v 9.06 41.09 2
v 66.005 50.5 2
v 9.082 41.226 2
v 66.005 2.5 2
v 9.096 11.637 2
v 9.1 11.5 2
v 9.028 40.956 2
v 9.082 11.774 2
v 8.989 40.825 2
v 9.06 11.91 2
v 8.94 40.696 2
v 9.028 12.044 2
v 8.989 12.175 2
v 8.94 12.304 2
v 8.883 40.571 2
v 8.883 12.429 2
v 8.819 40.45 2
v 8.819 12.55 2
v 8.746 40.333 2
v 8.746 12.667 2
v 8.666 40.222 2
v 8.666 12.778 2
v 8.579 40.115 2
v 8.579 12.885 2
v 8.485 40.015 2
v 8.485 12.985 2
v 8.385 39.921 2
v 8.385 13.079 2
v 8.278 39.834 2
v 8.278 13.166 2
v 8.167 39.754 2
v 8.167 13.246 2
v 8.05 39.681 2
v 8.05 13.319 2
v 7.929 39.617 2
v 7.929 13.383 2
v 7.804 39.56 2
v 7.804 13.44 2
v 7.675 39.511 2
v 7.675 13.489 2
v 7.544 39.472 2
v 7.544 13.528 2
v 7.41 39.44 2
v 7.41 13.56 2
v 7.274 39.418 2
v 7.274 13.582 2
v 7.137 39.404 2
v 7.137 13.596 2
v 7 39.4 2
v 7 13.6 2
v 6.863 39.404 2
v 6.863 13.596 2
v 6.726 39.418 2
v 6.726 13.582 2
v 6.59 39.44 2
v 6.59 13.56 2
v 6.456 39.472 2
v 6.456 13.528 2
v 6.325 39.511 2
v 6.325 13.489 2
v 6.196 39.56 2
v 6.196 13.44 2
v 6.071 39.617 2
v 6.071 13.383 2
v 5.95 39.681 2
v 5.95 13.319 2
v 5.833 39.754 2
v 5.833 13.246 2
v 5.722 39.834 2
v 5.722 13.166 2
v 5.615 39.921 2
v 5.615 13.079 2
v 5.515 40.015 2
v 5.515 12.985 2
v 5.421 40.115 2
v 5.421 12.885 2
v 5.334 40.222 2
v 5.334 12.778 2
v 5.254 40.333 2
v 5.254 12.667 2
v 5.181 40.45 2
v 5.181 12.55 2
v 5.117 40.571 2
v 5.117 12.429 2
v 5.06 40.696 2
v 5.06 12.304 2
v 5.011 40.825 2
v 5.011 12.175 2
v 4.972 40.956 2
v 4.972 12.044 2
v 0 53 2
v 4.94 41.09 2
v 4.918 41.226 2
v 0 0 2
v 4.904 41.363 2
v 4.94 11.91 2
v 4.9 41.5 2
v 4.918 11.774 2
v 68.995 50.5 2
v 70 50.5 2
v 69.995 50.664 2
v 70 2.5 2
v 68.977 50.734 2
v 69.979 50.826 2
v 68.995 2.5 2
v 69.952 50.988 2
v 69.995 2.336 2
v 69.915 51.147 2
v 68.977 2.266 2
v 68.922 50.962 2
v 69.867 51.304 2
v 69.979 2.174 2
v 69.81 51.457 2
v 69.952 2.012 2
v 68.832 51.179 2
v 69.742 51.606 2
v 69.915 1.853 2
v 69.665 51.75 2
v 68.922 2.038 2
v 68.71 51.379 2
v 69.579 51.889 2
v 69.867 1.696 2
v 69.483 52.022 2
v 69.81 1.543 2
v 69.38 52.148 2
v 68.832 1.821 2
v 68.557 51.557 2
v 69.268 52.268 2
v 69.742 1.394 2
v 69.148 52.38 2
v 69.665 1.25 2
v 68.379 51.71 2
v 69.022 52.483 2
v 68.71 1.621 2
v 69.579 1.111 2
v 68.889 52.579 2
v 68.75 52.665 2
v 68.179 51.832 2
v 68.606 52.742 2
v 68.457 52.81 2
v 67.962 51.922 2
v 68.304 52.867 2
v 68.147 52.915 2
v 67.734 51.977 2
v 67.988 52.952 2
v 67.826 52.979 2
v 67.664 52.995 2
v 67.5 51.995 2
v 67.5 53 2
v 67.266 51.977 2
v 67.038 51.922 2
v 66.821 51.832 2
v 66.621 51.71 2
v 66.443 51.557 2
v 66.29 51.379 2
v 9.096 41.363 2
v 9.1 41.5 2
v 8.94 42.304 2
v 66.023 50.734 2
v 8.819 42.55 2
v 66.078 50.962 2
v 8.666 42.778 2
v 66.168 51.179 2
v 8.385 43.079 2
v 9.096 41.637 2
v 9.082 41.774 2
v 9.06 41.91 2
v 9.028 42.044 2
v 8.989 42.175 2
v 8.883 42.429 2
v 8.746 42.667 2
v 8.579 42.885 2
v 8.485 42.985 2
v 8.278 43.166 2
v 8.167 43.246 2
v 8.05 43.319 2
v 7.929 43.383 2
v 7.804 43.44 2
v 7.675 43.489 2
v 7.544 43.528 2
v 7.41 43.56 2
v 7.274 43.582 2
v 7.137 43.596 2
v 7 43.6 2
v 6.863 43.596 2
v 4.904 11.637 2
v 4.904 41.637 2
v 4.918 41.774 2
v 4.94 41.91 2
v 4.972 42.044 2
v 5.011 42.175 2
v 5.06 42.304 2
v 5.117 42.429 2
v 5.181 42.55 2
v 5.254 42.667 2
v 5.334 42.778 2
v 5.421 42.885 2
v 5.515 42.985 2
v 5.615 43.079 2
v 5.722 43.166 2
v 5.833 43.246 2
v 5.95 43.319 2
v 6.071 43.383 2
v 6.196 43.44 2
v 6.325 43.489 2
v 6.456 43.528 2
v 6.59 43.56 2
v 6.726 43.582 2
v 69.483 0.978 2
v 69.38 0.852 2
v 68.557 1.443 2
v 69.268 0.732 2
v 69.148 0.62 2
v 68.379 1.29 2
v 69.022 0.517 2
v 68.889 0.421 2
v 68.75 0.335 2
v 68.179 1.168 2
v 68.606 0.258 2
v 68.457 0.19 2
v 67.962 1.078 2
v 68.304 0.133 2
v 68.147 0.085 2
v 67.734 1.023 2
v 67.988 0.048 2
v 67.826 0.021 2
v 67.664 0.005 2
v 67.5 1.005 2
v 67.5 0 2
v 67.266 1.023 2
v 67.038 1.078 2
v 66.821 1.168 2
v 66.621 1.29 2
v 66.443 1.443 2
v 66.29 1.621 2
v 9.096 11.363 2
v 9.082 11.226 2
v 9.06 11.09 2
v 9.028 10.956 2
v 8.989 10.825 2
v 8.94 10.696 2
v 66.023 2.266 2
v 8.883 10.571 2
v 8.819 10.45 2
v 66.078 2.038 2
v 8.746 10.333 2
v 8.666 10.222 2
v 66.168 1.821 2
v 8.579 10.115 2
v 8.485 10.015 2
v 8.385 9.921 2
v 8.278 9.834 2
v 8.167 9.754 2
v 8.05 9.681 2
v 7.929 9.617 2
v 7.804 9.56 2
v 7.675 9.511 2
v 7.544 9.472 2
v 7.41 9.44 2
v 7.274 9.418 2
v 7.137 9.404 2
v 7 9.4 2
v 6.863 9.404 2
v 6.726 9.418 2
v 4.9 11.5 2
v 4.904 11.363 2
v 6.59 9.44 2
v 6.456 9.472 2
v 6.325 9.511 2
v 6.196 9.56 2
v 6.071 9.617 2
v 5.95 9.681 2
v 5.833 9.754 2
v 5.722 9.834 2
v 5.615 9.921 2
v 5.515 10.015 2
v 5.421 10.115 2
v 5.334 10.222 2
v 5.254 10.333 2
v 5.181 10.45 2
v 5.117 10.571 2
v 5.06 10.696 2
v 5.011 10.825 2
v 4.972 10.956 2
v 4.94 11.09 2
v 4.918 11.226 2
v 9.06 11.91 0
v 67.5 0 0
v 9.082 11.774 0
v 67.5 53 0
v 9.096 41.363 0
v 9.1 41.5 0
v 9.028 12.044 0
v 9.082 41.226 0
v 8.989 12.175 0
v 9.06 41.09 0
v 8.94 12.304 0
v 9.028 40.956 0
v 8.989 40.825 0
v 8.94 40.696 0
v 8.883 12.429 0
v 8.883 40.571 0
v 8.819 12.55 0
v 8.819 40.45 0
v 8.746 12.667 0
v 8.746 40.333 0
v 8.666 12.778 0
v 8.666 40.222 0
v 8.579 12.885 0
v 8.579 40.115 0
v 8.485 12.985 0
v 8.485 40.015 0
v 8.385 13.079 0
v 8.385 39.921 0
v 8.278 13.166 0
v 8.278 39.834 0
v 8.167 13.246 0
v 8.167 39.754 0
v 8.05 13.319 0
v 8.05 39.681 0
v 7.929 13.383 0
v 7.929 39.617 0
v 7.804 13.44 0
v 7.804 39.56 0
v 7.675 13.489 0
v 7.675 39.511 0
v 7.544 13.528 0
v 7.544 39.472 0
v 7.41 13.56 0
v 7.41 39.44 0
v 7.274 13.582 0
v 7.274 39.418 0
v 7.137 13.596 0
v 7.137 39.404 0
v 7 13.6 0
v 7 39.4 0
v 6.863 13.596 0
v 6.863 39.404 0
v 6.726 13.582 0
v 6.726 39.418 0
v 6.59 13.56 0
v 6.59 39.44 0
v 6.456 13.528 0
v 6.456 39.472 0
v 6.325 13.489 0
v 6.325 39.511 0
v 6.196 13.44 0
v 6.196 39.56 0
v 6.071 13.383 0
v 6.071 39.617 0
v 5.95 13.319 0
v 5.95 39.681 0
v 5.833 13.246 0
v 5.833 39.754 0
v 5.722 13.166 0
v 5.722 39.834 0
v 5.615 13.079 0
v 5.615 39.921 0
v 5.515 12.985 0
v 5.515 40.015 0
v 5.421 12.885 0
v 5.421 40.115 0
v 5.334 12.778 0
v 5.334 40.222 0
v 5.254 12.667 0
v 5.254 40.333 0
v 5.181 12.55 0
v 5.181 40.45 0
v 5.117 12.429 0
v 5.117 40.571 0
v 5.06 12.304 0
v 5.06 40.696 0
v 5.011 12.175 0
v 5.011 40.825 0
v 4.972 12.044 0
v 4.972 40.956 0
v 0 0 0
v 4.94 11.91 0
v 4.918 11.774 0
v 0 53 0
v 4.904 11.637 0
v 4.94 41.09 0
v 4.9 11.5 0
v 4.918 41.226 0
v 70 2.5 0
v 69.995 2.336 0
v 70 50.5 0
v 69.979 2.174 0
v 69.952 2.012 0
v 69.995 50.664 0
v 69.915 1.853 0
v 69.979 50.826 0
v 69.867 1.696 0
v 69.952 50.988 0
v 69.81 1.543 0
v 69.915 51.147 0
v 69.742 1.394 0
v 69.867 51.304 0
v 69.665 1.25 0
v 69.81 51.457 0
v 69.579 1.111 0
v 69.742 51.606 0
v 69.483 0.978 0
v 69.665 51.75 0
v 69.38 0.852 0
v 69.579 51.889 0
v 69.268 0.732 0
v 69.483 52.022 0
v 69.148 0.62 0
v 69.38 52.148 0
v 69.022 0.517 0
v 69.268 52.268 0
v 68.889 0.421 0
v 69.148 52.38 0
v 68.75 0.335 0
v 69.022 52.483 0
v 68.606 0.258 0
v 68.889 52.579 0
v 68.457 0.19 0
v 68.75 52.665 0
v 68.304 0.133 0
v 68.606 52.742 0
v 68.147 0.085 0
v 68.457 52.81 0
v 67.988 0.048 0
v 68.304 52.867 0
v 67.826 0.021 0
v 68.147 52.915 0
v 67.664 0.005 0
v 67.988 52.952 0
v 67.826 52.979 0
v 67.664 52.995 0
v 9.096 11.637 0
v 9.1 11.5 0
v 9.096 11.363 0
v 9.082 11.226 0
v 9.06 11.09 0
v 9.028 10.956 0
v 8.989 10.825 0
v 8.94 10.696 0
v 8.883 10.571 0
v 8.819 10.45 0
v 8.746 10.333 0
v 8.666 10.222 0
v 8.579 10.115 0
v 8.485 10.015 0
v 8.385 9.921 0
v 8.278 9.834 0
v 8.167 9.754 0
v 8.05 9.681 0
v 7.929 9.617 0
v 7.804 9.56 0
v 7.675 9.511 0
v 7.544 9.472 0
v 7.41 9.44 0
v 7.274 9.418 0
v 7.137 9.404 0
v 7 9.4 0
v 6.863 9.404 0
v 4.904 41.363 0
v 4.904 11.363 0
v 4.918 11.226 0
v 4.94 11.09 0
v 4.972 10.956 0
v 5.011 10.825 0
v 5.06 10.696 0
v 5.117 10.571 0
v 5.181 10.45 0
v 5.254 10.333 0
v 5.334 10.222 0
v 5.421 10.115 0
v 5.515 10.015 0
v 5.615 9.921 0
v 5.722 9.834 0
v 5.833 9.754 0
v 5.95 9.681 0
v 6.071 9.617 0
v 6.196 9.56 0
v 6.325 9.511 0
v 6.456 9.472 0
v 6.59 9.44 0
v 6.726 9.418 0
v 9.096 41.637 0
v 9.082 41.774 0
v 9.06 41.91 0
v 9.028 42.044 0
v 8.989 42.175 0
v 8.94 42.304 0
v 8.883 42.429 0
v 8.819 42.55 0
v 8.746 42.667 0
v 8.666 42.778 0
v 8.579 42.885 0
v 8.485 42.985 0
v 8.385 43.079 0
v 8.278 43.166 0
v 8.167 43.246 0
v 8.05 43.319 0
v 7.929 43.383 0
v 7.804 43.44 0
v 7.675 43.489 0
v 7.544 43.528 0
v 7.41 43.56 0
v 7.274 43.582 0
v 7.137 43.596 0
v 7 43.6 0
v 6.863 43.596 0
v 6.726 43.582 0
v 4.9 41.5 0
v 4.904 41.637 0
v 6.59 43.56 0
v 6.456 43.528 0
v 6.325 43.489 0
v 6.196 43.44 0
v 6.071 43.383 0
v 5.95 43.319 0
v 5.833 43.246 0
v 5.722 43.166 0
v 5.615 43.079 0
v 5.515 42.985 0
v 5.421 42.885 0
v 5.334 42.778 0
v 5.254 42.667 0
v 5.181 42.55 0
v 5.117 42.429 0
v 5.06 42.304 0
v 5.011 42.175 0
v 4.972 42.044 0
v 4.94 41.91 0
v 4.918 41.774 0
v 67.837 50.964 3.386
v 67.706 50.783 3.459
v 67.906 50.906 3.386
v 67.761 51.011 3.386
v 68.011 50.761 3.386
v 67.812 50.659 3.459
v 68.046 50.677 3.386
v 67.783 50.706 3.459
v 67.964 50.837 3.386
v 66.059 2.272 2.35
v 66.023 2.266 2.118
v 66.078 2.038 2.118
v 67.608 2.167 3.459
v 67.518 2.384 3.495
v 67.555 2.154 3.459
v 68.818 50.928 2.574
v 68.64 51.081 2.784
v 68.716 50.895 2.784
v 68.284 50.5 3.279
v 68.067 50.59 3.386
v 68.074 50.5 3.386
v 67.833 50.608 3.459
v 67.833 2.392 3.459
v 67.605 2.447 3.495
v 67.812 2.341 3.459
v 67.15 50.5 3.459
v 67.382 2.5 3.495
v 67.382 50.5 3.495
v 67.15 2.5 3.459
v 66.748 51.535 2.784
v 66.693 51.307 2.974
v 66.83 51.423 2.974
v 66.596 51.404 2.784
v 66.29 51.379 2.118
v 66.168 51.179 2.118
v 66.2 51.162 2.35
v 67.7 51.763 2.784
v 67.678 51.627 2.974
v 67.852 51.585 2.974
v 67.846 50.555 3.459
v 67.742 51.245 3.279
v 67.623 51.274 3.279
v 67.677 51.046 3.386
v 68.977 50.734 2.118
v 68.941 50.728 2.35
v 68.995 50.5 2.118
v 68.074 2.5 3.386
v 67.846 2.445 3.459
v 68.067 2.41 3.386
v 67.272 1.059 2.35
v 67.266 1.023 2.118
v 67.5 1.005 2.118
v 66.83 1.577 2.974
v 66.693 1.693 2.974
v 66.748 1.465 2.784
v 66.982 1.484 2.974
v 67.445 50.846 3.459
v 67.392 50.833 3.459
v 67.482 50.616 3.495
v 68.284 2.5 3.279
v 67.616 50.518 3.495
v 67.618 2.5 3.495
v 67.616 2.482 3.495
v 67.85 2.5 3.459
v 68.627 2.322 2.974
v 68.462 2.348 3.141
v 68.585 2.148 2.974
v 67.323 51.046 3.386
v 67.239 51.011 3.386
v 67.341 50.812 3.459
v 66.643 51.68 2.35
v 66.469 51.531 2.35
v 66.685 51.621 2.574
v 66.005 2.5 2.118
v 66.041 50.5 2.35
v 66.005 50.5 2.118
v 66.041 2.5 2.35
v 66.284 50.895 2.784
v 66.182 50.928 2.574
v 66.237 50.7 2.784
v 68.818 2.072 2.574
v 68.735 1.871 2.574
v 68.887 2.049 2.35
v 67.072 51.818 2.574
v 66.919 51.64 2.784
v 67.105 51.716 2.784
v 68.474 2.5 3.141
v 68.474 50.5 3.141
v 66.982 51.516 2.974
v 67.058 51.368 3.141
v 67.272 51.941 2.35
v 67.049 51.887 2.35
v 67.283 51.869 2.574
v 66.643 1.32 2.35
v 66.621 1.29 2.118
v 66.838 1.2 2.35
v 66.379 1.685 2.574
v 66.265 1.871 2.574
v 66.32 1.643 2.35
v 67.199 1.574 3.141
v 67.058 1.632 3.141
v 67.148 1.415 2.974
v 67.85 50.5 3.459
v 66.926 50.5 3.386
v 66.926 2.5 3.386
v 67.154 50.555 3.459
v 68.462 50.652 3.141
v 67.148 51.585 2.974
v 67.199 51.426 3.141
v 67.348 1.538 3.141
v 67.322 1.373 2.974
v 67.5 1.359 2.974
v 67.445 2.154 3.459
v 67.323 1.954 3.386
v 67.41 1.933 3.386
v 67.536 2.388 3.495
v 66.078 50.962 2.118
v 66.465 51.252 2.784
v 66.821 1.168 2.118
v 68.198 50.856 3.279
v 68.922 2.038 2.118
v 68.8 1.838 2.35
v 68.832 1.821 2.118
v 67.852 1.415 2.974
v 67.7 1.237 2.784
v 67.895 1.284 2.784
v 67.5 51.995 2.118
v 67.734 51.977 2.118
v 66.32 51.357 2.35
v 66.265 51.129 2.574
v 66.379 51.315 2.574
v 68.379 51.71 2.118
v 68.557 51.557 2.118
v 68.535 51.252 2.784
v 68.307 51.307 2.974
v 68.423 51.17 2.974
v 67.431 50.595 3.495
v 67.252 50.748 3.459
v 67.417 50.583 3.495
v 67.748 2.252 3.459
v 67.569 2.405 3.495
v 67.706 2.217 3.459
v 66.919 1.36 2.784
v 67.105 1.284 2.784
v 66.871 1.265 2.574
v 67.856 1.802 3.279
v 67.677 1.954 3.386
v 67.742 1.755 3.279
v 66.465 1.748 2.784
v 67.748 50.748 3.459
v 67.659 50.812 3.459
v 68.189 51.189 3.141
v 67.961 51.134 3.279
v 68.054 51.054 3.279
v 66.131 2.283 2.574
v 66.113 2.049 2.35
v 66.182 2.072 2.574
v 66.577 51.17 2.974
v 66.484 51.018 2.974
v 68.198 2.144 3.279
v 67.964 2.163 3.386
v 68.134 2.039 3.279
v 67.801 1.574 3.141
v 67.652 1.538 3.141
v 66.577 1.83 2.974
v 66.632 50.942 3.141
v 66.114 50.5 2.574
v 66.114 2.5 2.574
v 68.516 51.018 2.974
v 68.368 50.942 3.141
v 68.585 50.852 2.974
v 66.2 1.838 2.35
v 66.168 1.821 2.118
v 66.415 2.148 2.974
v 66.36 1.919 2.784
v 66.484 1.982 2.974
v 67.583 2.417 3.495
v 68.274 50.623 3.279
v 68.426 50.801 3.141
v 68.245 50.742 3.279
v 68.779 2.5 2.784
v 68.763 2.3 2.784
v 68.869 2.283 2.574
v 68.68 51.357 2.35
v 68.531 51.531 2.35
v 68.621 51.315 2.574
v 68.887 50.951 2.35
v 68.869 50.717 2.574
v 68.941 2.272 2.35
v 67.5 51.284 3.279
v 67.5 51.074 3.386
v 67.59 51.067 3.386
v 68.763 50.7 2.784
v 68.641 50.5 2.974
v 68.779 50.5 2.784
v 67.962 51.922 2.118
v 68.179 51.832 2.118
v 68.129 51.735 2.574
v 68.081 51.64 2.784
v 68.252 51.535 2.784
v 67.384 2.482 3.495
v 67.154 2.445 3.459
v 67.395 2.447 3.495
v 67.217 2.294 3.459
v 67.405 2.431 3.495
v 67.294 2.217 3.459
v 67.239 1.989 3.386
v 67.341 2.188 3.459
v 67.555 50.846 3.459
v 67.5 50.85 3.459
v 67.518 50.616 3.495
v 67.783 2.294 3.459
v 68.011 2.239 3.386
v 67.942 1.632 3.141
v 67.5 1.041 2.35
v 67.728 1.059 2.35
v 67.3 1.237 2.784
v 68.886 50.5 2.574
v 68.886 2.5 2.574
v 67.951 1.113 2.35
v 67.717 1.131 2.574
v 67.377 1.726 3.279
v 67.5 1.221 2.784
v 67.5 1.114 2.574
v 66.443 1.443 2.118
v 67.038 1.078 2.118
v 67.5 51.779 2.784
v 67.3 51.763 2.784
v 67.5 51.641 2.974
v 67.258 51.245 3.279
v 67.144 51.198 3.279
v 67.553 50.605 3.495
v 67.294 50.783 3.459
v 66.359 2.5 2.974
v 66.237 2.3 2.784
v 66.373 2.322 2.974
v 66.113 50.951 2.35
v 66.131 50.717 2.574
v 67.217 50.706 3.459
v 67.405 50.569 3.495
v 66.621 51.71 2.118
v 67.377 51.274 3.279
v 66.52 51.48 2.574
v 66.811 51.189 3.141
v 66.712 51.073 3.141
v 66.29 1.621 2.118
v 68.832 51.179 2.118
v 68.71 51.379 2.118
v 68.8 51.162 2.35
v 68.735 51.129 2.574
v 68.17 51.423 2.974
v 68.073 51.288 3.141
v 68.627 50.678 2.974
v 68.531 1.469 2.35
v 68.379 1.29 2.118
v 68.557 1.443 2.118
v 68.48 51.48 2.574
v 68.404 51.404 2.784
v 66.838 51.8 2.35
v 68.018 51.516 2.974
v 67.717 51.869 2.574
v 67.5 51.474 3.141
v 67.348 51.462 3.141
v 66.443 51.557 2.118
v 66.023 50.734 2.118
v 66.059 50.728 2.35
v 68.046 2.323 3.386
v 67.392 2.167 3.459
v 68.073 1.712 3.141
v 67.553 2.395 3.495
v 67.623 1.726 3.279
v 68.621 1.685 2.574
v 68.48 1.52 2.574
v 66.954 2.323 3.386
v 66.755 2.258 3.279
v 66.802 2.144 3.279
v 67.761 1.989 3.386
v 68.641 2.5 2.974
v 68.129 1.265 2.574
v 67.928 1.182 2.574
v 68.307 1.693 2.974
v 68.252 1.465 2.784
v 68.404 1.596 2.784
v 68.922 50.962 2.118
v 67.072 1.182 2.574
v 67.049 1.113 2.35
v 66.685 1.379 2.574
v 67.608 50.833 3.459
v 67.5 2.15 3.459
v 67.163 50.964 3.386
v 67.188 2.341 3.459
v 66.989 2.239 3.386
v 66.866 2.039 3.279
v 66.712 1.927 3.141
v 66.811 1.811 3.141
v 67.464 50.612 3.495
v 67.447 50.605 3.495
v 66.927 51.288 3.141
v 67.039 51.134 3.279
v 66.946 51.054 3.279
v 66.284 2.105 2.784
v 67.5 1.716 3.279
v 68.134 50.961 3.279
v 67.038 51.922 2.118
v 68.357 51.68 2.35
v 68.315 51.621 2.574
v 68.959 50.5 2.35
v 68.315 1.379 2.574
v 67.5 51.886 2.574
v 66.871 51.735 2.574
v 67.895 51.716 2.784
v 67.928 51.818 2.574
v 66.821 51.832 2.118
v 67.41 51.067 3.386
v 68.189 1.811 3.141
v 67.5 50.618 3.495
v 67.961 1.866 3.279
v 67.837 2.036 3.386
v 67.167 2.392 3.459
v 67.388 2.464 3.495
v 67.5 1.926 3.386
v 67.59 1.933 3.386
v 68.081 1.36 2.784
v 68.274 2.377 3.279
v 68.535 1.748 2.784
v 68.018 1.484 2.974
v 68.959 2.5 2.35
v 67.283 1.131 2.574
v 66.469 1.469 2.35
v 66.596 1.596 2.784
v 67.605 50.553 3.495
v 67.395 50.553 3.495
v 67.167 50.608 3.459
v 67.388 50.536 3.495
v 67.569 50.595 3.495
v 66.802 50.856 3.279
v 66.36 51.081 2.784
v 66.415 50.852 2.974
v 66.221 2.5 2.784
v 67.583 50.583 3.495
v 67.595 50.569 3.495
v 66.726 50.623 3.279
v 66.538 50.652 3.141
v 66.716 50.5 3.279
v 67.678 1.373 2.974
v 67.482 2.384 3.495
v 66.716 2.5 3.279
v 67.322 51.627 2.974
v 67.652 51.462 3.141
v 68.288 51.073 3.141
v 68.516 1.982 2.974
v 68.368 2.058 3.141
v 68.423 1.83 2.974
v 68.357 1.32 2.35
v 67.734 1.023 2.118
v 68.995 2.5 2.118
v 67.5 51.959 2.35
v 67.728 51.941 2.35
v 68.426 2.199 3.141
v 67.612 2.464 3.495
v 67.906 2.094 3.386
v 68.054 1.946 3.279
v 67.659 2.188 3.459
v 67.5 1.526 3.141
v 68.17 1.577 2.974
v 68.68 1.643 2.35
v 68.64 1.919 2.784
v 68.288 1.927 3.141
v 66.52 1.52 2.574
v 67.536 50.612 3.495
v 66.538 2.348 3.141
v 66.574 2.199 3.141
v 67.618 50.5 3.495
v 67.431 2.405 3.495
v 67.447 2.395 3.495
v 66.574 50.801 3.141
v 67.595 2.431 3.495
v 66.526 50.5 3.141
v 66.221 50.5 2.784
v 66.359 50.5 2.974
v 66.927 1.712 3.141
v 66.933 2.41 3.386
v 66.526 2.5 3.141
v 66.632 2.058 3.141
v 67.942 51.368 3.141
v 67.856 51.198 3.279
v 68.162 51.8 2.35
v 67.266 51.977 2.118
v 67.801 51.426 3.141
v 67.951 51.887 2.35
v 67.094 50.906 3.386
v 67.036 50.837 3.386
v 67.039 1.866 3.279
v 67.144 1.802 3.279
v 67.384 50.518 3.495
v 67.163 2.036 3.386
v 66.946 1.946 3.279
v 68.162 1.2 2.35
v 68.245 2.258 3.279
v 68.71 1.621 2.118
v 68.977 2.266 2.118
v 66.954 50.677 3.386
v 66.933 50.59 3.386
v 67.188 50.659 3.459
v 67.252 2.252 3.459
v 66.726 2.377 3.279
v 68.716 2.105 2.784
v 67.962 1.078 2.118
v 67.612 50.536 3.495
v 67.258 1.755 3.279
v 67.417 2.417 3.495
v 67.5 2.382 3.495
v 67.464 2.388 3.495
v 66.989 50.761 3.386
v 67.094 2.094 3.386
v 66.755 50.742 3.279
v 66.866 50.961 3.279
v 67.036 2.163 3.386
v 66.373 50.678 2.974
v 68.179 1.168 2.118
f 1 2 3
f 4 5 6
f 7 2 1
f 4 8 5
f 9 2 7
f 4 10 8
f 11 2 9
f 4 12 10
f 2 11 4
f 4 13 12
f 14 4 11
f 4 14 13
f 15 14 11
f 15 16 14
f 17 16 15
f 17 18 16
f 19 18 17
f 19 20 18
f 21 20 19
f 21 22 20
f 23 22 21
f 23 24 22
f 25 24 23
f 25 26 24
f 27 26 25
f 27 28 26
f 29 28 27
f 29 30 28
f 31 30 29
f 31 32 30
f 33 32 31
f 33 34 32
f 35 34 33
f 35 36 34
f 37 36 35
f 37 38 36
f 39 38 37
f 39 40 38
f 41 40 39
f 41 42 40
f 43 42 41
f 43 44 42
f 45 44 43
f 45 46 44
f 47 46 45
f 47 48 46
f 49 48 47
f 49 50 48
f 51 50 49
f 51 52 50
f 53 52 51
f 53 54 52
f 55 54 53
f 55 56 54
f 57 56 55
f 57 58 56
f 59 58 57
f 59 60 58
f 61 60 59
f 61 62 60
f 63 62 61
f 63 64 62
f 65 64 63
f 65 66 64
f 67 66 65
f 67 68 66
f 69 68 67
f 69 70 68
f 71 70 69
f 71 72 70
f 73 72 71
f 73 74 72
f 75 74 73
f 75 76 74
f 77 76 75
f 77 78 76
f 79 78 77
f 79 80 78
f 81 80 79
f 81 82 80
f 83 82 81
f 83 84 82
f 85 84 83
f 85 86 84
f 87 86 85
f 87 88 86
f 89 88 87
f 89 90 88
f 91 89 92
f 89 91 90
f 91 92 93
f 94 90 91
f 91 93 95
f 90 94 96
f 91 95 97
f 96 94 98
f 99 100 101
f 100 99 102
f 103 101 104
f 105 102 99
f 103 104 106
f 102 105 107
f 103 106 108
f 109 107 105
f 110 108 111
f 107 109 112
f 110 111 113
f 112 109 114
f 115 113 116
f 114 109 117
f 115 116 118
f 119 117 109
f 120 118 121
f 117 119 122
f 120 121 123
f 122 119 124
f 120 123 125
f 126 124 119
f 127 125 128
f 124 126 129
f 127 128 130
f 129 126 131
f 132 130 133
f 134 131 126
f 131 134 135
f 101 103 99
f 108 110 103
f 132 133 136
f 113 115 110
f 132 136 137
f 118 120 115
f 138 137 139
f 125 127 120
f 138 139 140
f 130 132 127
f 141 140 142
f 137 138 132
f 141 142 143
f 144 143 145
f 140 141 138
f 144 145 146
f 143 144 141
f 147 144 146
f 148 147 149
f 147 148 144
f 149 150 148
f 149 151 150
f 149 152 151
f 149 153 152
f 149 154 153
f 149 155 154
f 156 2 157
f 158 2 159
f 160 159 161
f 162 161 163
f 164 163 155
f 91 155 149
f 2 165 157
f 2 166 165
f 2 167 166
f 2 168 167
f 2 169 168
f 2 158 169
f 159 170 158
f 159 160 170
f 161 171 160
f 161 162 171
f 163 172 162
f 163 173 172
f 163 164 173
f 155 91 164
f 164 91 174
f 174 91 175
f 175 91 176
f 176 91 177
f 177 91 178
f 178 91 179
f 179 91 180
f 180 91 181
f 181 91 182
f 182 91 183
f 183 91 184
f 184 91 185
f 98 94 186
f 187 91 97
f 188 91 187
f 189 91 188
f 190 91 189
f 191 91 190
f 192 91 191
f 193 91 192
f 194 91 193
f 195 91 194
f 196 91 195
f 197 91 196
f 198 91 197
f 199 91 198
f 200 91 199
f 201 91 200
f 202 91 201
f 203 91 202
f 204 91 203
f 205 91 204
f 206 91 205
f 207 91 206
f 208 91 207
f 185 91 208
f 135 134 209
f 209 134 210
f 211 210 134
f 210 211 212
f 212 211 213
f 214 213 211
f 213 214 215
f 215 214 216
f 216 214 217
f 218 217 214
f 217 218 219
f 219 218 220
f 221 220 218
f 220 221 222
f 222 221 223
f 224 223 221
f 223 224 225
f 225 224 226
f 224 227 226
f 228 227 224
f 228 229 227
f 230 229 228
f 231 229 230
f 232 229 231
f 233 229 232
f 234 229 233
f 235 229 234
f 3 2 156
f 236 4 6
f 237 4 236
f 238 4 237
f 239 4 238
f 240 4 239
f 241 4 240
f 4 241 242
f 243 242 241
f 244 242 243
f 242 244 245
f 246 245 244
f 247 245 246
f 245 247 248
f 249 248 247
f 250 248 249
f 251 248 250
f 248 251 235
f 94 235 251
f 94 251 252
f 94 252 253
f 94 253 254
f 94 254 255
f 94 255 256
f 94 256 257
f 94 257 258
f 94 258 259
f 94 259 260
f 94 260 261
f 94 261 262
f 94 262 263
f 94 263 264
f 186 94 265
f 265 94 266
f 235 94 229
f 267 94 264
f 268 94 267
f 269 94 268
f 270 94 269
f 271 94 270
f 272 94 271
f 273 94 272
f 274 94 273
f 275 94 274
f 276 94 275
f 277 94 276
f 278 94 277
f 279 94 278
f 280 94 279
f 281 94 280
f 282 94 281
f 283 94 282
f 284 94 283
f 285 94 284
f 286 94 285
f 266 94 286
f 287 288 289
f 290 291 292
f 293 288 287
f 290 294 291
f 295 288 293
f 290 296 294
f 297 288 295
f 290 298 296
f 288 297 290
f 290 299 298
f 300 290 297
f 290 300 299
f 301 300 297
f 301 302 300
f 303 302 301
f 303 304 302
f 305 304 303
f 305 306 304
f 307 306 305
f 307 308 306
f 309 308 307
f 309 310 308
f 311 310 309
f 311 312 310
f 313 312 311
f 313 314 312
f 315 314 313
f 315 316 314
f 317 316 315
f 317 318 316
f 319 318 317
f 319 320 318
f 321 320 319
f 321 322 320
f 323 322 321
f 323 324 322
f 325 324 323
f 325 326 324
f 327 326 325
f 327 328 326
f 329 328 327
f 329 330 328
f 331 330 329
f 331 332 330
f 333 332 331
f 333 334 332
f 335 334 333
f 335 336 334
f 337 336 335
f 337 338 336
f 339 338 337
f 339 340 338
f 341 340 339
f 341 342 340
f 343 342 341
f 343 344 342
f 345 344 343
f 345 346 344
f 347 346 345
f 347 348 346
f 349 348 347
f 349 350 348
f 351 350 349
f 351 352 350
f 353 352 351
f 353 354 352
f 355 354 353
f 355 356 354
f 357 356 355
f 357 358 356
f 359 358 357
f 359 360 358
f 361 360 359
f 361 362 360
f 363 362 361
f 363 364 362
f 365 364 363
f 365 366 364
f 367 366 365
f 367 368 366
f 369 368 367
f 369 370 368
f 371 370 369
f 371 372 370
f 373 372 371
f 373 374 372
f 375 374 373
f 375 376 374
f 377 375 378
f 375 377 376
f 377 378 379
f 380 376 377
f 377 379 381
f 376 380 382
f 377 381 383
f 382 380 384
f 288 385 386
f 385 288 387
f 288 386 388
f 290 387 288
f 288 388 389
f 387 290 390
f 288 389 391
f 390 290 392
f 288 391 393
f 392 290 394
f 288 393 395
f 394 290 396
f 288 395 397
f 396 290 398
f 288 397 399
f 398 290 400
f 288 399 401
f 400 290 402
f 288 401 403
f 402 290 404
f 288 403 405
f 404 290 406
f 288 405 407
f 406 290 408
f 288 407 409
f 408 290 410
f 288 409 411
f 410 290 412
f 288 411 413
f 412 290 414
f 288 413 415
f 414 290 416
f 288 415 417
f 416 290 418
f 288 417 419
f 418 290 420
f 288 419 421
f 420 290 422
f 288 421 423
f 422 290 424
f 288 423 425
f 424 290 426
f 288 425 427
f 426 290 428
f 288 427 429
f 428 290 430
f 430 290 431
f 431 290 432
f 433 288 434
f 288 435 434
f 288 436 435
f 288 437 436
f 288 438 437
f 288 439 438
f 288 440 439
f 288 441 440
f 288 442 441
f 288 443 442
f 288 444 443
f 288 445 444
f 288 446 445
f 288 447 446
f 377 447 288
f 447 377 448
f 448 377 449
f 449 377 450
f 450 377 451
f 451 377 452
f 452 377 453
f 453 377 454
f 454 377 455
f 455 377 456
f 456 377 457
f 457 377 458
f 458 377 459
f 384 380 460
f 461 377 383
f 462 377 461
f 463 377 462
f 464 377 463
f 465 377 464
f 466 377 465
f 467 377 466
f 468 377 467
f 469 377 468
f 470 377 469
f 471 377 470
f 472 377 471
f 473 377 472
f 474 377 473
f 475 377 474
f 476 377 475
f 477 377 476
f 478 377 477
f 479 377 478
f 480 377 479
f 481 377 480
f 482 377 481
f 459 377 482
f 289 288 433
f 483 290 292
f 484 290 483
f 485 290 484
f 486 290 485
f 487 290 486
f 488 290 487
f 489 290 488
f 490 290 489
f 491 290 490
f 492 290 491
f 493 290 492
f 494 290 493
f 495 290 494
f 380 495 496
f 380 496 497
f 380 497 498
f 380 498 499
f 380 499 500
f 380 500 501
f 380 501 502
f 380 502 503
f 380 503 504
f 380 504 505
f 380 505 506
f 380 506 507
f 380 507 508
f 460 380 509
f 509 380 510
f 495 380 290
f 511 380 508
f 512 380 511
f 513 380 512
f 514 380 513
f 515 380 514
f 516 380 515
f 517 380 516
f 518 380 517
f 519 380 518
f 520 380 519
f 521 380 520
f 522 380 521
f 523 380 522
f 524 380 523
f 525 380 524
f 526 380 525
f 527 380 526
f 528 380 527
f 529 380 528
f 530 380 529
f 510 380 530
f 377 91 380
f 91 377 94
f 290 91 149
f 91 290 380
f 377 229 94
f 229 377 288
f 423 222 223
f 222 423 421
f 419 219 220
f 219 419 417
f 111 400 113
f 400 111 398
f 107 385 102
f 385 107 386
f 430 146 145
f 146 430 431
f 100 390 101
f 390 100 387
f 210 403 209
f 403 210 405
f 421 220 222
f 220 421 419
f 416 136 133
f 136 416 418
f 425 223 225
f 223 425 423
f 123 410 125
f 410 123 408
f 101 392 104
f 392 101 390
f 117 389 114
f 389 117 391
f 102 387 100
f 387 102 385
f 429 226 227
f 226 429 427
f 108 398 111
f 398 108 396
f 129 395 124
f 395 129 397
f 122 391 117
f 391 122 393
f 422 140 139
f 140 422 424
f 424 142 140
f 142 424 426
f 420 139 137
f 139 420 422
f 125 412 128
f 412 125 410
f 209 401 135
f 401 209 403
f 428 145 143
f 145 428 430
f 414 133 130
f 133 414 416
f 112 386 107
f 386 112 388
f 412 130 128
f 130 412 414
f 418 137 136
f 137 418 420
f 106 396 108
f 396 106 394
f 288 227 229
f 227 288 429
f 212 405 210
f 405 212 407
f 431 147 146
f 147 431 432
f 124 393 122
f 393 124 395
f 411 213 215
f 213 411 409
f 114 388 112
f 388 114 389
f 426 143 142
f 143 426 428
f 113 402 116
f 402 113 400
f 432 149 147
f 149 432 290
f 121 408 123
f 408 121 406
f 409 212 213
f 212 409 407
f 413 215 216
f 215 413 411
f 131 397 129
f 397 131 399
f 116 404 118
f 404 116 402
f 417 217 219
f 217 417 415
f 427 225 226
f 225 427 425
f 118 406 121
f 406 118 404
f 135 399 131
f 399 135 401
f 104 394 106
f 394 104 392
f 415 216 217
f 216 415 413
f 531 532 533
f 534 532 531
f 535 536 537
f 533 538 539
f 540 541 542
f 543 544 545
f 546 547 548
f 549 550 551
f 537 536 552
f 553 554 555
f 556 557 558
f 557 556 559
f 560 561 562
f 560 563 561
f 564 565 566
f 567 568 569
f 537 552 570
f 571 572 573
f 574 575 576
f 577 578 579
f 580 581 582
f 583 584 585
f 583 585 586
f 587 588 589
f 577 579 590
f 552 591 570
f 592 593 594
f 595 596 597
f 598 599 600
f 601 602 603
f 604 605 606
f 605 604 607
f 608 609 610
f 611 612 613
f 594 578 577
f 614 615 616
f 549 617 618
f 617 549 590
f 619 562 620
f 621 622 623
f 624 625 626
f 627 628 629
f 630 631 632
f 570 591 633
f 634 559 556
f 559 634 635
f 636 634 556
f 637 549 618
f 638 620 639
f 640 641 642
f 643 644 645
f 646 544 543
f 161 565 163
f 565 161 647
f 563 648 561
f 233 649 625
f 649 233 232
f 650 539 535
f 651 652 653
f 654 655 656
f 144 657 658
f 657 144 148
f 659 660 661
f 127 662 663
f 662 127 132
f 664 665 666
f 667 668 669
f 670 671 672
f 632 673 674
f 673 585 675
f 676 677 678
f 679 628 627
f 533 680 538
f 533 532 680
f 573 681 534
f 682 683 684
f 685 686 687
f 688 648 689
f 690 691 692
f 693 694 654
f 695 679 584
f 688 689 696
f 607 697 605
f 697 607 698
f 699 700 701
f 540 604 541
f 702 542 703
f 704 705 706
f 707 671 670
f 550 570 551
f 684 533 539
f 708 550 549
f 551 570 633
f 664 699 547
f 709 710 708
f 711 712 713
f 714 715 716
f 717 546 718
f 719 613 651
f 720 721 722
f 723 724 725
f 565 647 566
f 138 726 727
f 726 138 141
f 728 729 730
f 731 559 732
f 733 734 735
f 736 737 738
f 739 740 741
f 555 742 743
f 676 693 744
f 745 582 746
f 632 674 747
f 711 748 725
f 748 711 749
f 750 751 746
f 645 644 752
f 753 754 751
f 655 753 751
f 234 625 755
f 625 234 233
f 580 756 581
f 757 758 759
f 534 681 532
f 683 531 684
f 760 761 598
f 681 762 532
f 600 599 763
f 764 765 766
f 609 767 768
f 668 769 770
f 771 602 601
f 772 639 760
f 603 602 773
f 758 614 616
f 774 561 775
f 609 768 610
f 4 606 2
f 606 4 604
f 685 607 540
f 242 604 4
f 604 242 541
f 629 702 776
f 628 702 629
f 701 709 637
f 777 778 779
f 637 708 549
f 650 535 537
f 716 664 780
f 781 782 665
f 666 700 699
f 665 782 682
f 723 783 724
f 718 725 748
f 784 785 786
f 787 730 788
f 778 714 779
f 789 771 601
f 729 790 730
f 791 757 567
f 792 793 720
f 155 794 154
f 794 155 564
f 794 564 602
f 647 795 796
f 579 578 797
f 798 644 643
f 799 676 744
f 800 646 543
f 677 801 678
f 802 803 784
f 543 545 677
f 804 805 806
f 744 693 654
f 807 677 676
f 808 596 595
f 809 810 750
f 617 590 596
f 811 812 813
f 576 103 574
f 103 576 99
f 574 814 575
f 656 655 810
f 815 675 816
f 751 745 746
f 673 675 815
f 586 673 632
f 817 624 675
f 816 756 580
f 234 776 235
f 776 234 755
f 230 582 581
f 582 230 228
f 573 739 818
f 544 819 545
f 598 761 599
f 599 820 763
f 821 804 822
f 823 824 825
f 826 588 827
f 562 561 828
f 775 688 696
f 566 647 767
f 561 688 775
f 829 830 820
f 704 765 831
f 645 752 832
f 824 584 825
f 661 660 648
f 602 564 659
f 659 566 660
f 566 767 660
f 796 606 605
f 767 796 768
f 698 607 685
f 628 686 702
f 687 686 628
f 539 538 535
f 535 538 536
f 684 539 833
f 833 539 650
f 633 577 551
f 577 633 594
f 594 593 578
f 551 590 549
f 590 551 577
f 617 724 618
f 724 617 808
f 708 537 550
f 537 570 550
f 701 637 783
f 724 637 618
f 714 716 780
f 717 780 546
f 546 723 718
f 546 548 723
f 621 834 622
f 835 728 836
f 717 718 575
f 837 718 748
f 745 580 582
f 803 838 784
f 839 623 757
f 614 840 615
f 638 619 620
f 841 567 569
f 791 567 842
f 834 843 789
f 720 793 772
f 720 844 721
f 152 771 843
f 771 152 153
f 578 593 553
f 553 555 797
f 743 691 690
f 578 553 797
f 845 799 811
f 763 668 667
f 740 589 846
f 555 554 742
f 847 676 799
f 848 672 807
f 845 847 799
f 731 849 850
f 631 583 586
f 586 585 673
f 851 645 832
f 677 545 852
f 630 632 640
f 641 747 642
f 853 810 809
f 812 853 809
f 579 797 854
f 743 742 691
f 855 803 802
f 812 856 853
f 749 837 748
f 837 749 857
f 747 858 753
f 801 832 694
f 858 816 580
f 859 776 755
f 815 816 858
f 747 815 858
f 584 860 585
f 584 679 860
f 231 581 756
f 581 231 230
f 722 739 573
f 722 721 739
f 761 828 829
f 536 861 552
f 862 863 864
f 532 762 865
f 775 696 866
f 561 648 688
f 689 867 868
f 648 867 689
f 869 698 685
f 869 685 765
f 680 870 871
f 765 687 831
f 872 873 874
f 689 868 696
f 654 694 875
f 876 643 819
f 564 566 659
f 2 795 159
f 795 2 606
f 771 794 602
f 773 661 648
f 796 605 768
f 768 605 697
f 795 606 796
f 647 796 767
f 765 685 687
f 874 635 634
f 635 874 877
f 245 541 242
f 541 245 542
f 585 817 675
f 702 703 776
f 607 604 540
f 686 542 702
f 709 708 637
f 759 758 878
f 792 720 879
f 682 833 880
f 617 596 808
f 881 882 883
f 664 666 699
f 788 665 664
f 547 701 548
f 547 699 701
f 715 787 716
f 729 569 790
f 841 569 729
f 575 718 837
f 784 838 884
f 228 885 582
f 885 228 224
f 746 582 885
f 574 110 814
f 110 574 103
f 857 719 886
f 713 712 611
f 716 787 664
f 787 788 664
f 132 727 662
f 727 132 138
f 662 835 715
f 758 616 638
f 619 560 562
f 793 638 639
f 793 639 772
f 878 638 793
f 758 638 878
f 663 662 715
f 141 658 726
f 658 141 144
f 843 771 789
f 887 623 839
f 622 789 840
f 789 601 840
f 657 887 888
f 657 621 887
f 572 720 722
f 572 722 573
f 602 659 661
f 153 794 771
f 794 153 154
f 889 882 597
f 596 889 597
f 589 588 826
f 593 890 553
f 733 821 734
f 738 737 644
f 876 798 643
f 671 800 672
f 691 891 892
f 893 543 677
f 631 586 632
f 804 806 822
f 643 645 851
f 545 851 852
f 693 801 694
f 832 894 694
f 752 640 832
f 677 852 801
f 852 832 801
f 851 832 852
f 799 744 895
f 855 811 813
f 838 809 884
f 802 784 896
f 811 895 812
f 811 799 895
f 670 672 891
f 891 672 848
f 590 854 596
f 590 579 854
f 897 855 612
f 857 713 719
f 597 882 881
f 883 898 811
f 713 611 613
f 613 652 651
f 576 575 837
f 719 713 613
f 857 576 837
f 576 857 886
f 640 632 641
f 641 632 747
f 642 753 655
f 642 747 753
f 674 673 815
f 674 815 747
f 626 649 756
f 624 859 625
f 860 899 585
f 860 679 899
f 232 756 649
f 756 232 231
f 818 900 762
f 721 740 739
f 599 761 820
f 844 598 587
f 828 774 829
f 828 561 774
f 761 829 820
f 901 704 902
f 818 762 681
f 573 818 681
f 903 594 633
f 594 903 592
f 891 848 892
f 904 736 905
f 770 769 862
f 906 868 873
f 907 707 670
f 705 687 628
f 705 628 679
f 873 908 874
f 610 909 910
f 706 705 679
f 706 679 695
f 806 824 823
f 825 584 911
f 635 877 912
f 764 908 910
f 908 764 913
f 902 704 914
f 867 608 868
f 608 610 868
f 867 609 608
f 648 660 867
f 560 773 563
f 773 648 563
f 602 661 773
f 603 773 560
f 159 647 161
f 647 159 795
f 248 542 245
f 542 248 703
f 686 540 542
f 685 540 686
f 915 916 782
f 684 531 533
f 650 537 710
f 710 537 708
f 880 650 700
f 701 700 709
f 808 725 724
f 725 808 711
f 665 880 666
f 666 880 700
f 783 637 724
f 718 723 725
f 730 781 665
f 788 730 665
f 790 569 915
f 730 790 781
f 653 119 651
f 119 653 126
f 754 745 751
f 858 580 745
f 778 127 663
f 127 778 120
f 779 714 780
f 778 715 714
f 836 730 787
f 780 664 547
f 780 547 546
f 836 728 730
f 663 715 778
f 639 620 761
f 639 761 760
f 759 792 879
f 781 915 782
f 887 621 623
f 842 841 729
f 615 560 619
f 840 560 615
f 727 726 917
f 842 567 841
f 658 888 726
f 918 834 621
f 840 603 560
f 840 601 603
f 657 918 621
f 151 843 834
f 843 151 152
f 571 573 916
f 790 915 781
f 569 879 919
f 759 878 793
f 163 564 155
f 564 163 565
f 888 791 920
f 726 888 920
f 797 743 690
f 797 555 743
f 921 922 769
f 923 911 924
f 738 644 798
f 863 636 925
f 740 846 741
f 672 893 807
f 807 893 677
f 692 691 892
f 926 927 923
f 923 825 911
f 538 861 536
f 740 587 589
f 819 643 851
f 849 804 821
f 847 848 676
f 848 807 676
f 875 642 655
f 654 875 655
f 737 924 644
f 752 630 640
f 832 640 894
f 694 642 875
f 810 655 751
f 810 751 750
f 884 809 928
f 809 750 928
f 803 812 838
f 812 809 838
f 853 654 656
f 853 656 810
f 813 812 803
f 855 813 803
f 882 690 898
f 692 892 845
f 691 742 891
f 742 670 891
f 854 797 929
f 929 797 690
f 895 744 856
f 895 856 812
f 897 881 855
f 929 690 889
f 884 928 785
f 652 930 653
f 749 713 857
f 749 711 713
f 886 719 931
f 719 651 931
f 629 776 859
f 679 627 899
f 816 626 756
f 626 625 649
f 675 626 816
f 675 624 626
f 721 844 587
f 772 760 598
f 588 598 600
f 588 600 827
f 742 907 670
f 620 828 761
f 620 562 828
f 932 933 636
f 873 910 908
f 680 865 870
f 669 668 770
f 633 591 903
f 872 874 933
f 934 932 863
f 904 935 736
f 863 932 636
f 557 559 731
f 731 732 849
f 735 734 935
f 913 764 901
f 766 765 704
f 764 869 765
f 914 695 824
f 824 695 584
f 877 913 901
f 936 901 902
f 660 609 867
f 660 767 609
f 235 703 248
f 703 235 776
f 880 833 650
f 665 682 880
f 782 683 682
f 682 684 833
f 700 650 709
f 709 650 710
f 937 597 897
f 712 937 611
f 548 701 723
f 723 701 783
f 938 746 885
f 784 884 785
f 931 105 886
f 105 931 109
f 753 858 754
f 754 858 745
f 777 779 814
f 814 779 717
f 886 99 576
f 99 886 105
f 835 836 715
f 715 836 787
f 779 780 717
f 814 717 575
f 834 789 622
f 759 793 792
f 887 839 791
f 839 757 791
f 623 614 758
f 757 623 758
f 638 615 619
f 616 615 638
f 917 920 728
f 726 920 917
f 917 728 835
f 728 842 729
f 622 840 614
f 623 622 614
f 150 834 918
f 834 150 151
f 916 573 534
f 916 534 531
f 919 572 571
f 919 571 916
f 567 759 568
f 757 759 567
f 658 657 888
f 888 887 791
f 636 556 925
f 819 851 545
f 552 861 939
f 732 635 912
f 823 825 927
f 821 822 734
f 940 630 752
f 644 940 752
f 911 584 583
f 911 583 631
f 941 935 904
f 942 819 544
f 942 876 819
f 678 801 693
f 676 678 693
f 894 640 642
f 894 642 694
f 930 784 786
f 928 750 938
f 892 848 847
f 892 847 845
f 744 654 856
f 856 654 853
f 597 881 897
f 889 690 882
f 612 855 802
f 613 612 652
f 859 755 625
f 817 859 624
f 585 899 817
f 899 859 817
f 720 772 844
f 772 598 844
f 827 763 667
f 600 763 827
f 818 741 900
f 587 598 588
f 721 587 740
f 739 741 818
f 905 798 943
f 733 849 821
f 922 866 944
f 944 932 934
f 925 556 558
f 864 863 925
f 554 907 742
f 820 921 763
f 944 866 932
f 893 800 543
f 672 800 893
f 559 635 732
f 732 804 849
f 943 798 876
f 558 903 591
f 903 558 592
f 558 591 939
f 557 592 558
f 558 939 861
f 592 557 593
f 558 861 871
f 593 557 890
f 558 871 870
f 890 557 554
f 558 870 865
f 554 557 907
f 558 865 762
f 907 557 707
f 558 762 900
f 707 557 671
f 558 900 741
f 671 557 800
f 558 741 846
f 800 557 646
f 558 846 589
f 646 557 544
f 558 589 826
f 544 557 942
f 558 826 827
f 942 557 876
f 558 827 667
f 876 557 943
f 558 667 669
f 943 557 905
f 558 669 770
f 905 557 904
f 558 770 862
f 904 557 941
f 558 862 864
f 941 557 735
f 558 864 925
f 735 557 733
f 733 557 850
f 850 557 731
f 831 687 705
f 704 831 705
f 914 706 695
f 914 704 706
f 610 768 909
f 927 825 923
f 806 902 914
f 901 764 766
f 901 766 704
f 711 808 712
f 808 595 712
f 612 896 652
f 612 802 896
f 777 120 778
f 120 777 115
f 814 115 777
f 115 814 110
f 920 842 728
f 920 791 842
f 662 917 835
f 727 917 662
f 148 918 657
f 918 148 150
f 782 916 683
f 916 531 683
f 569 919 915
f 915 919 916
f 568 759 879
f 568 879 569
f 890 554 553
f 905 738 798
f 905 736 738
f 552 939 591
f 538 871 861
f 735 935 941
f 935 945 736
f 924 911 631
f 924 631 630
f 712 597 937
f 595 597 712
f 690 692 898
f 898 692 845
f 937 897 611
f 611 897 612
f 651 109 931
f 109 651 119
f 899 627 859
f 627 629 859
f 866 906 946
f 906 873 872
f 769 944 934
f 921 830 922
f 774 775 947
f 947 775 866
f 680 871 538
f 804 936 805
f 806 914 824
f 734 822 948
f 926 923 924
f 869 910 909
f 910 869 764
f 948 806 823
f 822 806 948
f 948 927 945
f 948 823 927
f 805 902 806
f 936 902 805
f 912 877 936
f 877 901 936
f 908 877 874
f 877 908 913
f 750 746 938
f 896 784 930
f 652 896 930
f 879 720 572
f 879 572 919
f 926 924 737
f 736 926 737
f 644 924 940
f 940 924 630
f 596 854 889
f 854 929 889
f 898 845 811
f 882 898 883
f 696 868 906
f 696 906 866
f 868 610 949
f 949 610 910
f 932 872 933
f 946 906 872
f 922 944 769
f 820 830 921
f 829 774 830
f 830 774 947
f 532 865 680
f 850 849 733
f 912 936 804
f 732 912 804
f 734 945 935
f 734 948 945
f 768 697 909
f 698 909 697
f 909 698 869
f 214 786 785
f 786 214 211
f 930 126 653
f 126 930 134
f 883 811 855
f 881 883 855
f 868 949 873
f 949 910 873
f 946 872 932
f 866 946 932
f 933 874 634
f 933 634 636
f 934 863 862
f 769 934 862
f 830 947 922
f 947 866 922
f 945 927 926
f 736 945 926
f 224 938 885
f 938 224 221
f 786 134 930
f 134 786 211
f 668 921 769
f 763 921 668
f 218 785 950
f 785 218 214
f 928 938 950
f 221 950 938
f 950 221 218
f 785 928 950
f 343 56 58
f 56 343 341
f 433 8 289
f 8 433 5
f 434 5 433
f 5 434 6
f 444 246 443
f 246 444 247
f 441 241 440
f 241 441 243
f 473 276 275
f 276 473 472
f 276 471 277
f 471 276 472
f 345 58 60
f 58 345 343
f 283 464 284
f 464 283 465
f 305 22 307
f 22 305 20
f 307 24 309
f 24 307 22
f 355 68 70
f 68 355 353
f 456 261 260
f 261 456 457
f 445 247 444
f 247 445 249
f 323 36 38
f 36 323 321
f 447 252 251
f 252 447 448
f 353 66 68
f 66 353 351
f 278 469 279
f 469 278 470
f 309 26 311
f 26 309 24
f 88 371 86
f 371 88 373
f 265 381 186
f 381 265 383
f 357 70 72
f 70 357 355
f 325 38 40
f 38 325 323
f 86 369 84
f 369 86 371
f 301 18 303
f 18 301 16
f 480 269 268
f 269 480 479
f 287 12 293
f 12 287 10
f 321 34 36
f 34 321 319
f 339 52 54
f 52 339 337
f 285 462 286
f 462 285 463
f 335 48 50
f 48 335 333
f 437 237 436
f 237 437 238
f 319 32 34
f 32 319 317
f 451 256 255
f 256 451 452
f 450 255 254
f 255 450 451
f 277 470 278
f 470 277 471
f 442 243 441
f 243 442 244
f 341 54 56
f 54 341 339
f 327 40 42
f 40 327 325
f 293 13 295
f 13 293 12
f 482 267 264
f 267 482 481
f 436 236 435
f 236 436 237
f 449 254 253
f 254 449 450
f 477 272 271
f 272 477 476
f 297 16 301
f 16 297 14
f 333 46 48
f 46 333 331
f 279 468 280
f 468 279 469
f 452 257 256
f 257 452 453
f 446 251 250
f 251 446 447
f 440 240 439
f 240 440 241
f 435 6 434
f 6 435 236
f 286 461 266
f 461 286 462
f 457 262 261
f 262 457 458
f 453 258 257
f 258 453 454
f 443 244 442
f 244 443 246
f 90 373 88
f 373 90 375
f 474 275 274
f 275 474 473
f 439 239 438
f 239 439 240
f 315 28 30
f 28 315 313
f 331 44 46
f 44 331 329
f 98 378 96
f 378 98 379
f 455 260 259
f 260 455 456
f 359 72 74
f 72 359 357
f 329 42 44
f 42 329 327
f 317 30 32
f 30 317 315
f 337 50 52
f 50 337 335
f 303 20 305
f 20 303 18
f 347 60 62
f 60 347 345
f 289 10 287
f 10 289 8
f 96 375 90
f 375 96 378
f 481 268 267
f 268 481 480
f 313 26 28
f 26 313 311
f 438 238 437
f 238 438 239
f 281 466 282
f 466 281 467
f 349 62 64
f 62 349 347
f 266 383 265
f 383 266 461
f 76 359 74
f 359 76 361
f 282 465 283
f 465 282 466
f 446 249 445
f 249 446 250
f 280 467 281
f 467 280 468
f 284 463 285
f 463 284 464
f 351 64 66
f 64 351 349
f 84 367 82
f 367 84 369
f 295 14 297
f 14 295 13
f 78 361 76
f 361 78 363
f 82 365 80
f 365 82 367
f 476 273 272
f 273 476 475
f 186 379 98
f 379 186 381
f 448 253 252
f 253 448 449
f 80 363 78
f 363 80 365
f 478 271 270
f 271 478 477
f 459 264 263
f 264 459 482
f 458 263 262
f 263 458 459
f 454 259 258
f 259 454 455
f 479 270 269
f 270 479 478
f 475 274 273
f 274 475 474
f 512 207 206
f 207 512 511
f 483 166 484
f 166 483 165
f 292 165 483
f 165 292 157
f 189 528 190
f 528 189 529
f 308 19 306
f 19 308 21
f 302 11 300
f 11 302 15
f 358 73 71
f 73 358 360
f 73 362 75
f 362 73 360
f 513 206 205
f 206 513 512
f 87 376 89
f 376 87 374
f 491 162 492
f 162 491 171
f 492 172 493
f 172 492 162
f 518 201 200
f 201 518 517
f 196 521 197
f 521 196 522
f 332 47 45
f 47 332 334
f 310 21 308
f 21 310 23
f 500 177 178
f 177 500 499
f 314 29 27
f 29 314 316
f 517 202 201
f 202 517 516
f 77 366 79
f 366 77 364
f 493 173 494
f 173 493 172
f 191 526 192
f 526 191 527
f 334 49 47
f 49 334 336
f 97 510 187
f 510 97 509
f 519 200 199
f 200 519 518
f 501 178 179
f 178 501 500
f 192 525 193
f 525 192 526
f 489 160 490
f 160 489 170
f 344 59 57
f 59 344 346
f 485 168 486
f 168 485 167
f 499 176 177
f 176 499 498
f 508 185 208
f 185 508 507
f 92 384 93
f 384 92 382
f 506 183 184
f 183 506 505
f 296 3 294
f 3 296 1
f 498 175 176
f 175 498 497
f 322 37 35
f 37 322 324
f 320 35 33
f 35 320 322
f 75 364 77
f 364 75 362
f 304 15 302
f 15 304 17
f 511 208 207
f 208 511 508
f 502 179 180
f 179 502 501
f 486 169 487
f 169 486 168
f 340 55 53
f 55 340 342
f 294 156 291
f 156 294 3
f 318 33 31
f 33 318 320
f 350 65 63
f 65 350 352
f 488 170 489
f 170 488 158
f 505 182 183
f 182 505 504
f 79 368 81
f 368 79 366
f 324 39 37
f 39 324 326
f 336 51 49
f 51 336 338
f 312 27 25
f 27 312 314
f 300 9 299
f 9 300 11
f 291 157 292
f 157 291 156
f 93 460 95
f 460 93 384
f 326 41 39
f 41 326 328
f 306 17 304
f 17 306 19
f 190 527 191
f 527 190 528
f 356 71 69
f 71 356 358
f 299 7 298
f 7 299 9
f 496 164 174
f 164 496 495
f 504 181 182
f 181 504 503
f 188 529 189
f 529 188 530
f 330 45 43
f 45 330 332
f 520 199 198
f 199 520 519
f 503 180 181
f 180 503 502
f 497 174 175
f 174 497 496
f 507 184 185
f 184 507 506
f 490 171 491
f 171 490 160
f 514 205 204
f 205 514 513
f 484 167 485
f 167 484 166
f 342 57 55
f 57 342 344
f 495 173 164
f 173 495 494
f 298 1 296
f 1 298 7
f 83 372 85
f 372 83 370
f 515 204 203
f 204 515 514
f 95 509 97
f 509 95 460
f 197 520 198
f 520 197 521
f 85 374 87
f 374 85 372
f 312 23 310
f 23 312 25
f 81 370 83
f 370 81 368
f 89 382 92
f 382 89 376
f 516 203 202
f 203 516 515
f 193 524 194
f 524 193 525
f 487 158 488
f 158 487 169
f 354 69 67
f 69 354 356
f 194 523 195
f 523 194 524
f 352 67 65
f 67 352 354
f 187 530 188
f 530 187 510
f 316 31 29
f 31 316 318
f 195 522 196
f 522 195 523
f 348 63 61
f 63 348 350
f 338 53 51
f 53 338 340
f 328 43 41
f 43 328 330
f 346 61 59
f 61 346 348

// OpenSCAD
// width
width = 70;

// length
length = 53;

// thickness
height = 2;

// rounded corners radius
corner_radius = 5;

// screw holes x offset
offset_x = 7;

// distance between holes
offset_y = 11.5;

// screw hole diameter
hole_diameter = 4.2;

// radius for beading
radius = 1.5;

/* [hidden] */
clearance = 0.01;


difference() {

    // plate
    union() {
        cube([width-corner_radius/2, length, height]);

        hull() {
            translate ([width-corner_radius/2, corner_radius/2, 0]) {
                cylinder(d=corner_radius, h=height, $fn=96);
            }
            translate ([width-corner_radius/2, length-corner_radius/2, 0]) {
                cylinder(d=corner_radius, h=height, $fn=96);
            }
        }

        hull () {
            translate ([width-corner_radius/2, corner_radius/2, height]) {
                sphere(radius, $fn = 40);
            }
            translate ([width-corner_radius/2, length-corner_radius/2, height]) {
                sphere(radius, $fn = 40);
            }
        }
    }

    // hole front
    translate ([offset_x, offset_y, -clearance]) {
        cylinder(d=hole_diameter, h=height+2*clearance, $fn=96);
    }

    // hole back
    translate ([offset_x, length - offset_y, -clearance]) {
        cylinder(d=hole_diameter, h=height+2*clearance, $fn=96);
    }
}
